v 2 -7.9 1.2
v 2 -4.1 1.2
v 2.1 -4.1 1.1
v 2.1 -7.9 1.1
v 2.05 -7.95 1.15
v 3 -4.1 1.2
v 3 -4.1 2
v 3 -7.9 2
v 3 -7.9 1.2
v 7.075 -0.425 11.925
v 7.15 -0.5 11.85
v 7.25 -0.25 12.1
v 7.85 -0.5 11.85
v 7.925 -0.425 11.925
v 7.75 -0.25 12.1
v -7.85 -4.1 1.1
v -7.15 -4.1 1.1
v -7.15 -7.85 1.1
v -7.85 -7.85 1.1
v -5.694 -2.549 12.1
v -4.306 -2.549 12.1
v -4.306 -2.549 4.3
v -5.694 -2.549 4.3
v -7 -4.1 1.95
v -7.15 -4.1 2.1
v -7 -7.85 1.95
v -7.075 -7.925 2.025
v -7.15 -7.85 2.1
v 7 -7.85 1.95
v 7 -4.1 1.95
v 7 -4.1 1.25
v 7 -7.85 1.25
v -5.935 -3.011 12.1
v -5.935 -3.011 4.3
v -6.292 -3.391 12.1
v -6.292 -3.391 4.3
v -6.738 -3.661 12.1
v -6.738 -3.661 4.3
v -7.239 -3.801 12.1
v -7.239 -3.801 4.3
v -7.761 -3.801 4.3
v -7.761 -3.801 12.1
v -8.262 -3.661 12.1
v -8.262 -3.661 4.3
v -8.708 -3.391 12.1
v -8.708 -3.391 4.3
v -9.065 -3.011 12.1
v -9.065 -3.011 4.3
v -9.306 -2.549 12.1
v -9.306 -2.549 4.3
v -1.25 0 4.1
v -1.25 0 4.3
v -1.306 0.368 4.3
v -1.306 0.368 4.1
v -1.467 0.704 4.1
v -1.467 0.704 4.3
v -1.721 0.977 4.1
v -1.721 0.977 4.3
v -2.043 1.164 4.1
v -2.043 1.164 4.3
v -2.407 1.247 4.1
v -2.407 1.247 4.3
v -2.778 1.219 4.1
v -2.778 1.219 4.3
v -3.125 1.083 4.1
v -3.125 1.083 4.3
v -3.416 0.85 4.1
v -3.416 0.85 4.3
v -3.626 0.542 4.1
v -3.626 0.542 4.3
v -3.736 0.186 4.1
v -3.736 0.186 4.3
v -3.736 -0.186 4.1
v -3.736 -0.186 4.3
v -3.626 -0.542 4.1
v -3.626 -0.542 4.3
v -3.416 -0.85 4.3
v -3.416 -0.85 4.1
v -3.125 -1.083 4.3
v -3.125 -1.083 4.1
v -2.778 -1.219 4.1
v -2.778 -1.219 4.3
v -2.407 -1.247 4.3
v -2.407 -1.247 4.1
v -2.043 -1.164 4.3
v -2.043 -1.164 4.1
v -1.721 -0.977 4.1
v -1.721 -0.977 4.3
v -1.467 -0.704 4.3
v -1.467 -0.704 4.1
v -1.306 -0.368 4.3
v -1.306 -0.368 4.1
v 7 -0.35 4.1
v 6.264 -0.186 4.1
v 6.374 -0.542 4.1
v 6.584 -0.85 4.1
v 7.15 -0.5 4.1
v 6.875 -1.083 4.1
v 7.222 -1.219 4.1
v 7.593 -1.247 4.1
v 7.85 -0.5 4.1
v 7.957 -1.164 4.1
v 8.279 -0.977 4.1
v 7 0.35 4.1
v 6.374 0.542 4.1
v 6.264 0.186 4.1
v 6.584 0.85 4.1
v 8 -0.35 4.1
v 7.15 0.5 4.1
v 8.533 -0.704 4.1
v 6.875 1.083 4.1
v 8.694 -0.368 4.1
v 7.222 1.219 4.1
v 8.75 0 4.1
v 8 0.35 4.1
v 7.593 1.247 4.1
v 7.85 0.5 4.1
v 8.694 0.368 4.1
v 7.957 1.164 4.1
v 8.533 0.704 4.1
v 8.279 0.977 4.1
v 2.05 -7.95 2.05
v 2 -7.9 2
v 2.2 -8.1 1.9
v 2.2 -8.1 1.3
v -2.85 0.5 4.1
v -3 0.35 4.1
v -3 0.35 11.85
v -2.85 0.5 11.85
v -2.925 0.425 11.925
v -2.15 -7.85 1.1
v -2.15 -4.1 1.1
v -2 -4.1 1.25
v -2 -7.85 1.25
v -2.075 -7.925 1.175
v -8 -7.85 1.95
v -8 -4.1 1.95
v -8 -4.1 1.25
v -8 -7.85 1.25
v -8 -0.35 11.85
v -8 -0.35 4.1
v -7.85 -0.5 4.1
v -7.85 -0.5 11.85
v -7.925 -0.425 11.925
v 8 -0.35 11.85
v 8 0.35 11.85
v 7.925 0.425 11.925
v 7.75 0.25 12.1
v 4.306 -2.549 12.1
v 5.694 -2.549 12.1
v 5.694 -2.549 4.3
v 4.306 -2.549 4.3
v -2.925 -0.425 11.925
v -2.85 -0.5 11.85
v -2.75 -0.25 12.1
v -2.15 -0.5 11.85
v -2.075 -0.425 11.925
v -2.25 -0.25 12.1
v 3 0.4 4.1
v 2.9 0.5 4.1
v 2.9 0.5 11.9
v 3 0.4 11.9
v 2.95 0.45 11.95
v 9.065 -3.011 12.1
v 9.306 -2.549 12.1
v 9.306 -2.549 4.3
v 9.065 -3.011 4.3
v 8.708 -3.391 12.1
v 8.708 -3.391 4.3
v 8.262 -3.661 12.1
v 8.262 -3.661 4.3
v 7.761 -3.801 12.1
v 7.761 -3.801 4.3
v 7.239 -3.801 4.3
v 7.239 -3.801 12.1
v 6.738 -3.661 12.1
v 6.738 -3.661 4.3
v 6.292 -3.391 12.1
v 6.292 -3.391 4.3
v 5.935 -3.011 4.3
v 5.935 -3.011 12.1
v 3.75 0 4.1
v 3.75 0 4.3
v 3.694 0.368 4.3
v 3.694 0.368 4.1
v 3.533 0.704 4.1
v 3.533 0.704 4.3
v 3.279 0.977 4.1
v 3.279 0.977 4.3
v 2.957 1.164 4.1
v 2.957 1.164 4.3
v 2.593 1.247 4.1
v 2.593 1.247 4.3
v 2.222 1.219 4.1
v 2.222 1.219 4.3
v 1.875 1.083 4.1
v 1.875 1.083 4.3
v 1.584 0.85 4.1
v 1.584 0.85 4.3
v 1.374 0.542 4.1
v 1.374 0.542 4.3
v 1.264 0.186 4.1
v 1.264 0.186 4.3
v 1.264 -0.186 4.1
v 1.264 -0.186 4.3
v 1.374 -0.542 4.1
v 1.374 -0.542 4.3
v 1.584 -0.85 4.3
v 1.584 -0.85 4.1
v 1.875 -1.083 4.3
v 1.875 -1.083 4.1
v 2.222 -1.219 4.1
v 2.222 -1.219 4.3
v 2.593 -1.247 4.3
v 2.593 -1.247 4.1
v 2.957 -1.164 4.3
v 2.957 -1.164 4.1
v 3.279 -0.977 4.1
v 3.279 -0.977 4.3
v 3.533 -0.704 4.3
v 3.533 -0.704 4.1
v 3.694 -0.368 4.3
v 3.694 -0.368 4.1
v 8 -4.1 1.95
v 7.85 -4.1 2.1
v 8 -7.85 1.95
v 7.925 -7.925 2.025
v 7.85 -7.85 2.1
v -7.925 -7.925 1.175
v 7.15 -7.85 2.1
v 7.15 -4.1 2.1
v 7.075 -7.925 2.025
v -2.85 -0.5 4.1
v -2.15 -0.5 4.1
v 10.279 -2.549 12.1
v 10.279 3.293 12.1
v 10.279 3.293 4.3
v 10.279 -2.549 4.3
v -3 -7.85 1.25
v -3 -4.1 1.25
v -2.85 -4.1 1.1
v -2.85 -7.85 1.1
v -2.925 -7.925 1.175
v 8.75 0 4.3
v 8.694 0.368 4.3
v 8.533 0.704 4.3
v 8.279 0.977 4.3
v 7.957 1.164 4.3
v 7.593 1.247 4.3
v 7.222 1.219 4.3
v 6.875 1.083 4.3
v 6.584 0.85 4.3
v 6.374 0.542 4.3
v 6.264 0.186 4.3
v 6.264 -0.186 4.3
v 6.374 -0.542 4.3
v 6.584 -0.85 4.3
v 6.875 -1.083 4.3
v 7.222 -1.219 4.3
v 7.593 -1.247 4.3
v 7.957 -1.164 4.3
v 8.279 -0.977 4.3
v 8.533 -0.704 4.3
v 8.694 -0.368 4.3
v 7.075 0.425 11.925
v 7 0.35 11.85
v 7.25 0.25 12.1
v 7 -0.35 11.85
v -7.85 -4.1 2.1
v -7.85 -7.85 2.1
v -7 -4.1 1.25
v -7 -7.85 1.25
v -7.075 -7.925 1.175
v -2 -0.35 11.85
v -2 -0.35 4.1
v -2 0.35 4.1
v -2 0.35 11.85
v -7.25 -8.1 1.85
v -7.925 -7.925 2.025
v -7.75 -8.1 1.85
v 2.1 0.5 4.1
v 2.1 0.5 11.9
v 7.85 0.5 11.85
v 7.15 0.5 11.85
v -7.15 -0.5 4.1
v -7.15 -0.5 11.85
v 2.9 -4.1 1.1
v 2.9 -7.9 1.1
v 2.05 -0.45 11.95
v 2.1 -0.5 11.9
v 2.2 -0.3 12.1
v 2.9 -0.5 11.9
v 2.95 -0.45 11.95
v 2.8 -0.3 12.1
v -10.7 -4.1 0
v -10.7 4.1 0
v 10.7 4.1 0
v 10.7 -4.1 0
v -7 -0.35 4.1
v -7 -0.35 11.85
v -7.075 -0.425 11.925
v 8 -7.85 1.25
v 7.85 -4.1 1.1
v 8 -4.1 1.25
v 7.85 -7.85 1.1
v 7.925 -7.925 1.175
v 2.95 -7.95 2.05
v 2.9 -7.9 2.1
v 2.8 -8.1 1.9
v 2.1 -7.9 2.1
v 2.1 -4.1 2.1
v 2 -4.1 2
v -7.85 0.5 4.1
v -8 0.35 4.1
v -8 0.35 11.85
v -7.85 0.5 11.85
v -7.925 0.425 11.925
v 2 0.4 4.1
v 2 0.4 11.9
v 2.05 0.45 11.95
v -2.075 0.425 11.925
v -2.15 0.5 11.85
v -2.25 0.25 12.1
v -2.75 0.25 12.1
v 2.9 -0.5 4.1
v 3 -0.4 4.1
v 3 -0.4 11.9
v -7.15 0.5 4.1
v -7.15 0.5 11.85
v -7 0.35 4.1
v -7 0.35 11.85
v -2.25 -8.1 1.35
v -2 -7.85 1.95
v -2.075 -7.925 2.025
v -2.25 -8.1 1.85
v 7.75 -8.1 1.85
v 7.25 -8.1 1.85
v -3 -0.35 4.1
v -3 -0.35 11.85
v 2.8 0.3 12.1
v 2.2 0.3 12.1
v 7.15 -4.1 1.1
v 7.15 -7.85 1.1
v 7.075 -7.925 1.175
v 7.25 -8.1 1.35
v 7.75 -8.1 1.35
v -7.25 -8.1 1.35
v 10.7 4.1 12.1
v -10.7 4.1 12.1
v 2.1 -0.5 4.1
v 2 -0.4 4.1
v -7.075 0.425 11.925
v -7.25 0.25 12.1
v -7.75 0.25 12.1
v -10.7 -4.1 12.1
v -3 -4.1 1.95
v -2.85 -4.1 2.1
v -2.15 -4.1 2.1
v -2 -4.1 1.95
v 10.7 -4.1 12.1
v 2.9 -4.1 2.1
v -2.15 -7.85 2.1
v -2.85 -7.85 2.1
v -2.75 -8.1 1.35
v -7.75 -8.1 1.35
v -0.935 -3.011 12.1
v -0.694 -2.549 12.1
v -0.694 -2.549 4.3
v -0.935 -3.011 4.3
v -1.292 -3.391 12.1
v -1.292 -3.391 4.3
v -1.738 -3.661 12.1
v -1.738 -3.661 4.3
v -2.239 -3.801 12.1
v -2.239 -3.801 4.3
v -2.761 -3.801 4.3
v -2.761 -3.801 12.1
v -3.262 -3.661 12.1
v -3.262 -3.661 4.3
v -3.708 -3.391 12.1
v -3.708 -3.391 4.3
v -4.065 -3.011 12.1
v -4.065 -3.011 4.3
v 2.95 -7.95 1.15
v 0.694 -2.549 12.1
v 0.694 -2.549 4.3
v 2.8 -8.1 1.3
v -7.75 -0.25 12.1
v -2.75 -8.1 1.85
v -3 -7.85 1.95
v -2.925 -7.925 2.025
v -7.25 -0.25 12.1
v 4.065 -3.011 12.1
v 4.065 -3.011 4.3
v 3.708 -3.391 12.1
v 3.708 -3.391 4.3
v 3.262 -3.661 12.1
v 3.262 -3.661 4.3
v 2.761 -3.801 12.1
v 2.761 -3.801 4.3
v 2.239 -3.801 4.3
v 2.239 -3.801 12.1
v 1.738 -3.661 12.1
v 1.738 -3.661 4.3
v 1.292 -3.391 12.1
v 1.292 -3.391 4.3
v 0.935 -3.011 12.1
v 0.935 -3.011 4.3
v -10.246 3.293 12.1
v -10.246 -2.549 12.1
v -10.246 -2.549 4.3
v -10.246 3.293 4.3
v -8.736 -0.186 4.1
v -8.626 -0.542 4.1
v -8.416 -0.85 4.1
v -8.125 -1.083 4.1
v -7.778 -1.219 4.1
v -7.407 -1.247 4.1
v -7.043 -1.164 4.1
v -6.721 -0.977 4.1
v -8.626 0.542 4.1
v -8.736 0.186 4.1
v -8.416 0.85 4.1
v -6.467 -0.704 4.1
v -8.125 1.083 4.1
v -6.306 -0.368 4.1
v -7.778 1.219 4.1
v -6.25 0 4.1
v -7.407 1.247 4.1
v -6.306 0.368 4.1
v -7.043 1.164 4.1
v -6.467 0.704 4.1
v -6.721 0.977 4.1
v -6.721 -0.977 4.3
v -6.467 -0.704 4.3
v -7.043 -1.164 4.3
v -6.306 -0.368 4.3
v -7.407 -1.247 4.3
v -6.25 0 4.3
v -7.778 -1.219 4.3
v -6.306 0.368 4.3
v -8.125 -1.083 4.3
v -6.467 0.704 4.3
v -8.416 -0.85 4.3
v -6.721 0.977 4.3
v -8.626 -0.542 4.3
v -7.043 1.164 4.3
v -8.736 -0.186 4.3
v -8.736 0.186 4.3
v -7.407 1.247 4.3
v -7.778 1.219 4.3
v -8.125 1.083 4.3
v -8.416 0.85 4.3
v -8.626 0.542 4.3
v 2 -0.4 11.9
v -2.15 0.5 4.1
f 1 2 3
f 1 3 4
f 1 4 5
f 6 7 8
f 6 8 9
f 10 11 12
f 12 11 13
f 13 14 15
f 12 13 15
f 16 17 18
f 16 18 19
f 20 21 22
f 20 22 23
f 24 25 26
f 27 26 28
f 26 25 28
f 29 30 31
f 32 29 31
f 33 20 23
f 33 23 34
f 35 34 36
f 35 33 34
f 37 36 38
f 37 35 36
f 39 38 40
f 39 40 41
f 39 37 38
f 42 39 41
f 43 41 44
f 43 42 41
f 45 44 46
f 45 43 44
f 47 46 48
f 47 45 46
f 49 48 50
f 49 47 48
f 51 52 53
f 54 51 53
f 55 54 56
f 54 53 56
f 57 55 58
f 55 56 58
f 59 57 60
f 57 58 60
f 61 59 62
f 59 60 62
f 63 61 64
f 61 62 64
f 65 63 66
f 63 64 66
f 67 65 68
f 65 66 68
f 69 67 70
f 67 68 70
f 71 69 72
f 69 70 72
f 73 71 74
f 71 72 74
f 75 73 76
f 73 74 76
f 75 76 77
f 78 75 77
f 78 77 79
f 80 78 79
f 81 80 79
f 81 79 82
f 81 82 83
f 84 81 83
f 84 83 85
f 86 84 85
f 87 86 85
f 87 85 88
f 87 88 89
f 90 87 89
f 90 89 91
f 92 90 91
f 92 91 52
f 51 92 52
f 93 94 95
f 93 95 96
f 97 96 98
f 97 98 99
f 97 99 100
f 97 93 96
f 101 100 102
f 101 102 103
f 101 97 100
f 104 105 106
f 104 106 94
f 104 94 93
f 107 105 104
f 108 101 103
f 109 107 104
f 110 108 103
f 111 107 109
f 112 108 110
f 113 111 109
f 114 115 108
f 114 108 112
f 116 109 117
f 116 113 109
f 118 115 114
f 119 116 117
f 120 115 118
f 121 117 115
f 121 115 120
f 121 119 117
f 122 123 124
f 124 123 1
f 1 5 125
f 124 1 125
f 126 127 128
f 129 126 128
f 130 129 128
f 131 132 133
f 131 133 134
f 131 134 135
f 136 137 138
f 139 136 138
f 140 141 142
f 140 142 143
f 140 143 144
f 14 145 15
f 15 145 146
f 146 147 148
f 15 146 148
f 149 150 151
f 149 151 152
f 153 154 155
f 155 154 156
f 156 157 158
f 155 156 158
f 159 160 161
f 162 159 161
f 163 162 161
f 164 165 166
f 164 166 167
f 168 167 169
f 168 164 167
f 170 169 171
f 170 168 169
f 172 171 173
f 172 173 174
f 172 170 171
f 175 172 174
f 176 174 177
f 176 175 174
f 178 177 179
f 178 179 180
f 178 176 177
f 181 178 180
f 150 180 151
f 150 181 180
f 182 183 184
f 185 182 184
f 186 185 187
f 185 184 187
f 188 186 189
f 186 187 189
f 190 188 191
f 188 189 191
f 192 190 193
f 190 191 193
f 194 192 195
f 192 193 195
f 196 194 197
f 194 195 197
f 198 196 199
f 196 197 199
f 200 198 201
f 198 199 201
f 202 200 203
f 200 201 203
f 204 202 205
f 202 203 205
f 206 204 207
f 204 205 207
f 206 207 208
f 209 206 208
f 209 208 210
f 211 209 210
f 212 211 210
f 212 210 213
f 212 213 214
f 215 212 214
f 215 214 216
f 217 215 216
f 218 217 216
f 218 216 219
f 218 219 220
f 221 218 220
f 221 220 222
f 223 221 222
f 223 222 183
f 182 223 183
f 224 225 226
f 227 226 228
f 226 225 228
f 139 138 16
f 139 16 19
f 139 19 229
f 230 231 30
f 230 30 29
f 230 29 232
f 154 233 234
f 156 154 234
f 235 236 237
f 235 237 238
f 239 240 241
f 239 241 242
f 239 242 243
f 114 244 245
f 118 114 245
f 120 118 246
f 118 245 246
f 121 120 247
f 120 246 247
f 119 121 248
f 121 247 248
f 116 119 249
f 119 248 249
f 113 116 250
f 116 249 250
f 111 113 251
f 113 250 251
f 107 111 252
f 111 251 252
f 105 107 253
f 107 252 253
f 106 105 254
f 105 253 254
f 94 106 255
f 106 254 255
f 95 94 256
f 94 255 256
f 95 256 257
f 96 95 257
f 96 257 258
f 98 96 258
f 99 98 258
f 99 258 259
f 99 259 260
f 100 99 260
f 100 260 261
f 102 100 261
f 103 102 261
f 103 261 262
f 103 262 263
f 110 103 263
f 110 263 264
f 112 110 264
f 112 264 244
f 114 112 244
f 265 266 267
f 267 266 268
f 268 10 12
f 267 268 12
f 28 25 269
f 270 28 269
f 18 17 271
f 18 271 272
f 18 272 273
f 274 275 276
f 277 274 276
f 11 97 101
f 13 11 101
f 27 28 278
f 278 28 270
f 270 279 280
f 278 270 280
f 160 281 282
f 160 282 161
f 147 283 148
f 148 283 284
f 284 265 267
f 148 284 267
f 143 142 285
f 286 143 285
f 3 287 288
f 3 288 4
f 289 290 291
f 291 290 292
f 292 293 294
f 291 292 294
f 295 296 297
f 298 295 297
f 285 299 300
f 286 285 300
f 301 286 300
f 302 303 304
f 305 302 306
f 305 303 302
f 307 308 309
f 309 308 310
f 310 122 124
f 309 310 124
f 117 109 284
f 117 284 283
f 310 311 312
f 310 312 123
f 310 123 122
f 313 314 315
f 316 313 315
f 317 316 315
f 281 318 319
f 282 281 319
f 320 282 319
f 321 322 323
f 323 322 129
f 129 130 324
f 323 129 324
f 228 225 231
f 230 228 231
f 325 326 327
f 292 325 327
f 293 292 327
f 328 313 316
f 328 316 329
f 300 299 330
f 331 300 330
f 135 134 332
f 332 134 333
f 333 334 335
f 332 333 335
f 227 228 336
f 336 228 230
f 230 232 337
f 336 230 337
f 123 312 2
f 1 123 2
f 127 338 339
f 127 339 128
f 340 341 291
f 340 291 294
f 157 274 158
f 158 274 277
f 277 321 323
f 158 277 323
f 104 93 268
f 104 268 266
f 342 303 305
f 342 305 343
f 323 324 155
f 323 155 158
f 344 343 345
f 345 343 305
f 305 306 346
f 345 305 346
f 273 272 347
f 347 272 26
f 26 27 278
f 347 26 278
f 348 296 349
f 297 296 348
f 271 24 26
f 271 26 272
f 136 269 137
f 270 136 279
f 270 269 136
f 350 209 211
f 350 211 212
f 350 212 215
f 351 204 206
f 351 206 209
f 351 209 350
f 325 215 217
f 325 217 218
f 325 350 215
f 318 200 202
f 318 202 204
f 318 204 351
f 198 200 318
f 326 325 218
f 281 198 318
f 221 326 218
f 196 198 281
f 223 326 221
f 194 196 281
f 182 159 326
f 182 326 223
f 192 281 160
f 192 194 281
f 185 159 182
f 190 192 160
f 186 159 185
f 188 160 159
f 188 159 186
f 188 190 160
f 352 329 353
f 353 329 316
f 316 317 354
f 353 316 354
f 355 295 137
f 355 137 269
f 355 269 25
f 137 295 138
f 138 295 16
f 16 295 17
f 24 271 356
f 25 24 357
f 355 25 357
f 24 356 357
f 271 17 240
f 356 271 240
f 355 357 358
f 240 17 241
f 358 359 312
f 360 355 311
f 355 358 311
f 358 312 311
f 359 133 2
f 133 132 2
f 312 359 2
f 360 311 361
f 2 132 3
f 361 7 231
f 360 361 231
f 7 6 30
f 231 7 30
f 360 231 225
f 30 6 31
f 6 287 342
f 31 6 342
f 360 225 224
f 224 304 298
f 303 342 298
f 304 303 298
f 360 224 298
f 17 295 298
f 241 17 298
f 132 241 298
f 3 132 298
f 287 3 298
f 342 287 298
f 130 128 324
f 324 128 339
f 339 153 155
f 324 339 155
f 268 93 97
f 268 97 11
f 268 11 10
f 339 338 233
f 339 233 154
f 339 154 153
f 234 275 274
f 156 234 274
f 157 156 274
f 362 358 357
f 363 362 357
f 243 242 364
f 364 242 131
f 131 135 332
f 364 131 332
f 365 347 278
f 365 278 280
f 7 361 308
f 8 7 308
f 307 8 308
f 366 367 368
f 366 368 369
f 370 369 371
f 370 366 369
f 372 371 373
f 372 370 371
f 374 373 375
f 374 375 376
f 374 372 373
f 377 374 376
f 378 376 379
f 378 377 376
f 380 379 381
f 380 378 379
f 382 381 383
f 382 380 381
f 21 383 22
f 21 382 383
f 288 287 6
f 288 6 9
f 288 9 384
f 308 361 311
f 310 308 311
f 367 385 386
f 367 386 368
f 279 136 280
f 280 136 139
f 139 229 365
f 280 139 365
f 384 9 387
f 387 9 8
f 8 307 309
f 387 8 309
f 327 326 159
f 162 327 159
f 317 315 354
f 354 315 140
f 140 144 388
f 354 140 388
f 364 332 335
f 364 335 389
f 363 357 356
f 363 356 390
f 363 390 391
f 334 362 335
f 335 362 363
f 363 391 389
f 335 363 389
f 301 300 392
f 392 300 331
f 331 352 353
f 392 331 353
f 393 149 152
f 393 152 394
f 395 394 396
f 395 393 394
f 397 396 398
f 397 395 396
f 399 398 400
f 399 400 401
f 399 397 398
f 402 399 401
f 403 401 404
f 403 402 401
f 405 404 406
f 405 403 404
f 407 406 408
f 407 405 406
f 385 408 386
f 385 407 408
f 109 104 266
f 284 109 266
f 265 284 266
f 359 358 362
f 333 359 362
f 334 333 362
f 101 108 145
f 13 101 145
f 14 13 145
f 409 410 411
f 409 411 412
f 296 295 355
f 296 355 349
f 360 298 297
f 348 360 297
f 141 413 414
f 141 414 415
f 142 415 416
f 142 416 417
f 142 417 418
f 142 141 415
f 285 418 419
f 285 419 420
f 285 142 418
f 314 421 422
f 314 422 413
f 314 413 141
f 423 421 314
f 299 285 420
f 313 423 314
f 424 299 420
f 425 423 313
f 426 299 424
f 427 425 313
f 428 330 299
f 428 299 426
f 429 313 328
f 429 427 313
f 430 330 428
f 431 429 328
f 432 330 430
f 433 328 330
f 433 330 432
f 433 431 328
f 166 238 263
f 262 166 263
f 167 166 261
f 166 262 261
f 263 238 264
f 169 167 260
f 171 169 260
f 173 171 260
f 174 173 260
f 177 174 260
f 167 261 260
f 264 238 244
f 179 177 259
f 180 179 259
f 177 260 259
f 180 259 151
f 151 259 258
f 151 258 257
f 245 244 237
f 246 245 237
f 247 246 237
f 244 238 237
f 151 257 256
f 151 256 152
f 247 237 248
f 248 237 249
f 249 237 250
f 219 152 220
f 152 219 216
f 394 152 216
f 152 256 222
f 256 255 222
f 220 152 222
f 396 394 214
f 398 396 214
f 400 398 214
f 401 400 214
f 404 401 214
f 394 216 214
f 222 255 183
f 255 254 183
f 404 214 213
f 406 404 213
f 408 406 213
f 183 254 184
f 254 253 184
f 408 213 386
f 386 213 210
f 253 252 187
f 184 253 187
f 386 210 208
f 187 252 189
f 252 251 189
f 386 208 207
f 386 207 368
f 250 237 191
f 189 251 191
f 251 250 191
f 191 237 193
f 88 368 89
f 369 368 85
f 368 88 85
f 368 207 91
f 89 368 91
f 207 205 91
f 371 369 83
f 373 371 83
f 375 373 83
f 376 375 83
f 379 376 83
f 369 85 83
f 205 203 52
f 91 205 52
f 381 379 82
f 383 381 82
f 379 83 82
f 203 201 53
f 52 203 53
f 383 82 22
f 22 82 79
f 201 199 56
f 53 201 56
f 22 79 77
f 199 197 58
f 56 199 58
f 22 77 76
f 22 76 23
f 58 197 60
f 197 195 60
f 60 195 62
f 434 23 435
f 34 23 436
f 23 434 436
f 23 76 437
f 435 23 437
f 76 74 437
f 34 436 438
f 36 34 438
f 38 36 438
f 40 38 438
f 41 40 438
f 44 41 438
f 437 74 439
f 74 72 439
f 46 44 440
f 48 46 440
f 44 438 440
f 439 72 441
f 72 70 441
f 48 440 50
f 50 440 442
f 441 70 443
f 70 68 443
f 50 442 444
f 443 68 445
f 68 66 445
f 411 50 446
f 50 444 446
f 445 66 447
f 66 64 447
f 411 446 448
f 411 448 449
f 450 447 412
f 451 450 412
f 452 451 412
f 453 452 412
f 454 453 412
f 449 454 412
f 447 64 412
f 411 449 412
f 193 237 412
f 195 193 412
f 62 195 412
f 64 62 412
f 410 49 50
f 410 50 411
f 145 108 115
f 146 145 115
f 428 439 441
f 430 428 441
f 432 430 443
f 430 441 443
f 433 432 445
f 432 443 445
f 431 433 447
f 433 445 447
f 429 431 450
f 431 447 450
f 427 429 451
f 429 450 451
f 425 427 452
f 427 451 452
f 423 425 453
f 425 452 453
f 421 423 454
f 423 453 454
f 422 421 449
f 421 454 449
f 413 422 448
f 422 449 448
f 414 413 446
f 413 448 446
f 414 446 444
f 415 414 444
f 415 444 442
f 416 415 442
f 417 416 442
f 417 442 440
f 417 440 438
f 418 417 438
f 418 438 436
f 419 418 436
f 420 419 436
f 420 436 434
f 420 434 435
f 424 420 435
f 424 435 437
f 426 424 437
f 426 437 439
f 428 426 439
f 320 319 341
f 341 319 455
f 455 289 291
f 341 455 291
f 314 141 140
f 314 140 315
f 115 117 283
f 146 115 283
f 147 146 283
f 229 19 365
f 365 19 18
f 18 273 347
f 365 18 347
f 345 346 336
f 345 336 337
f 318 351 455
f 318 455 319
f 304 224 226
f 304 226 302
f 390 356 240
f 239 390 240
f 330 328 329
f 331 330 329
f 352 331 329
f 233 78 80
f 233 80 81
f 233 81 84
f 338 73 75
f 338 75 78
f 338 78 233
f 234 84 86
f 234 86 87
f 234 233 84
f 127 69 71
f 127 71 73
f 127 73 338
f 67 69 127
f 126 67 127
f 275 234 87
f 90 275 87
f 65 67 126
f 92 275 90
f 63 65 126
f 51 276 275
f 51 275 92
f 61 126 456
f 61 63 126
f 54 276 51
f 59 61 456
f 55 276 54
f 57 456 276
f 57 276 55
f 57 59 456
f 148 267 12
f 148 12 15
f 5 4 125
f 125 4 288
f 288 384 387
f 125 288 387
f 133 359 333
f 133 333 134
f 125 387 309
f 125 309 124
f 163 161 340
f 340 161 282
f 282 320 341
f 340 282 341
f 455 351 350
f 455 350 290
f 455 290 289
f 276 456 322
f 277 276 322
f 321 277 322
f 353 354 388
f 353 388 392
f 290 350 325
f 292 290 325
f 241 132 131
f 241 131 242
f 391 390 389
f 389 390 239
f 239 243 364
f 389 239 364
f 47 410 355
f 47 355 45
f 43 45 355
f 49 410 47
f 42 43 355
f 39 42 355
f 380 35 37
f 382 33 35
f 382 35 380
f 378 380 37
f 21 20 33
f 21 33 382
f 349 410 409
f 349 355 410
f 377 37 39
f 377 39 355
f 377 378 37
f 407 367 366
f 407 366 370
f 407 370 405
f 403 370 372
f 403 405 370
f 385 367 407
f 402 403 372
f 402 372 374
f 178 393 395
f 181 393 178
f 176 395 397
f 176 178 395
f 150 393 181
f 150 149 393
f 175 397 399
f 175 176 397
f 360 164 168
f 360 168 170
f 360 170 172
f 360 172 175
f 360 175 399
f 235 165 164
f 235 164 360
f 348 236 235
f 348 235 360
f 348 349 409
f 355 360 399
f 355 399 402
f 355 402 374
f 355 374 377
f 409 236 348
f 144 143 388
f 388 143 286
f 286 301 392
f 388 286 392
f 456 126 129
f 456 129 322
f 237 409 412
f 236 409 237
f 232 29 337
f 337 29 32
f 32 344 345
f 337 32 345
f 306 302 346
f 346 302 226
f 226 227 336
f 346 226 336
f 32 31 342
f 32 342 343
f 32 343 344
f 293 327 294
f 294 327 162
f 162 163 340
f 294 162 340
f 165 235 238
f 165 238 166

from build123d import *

# Parameters (mm, degrees)
SKETCH_1_W          = 21.4
SKETCH_1_H          = 8.2
EXTRUDE_1_DEPTH     = 12.1
SKETCH_4_R          = 1.25
CUT_EXTRUDE_3_DEPTH = 8
CUT_EXTRUDE_4_DEPTH = 7.8
SKETCH_7_W          = 1
SKETCH_7_H          = 1
EXTRUDE_2_DEPTH     = 8
CHAMFER_1_SIZE      = 0.15
CHAMFER_2_SIZE      = 0.25
SKETCH_8_W          = 1
SKETCH_8_H          = 1
EXTRUDE_3_DEPTH     = 4
CHAMFER_3_SIZE      = 0.15
CHAMFER_4_SIZE      = 0.25
CHAMFER_6_SIZE      = 0.1
CHAMFER_7_SIZE      = 0.2
CHAMFER_8_SIZE      = 0.1
CHAMFER_9_SIZE      = 0.2


with BuildPart() as part:
    # Эскиз1 → Бобышка-Вытянуть1 (new body)
    with BuildSketch(Plane.XY):
        Rectangle(SKETCH_1_W, SKETCH_1_H)
    extrude(amount=EXTRUDE_1_DEPTH)

    # Эскиз4 → Вырез-Вытянуть3 (cut)
    with BuildSketch(Plane.XY.offset(12.1)):
        with Locations((-7.5, 0)):
            Circle(SKETCH_4_R)
        with Locations((-2.5, 0)):
            Circle(SKETCH_4_R)
        with Locations((2.5, 0)):
            Circle(SKETCH_4_R)
        with Locations((7.5, 0)):
            Circle(SKETCH_4_R)
    extrude(amount=-CUT_EXTRUDE_3_DEPTH, mode=Mode.SUBTRACT)

    # Эскиз5 → Вырез-Вытянуть4 (cut)
    with BuildSketch(Plane.XY.offset(12.1)):
        with BuildLine():
            Line((-10.245621634, 0), (-10.245621634, 3.292901982))
            Line((-10.245621634, 3.292901982), (0.278509544, 3.292901982))
            Line((0.278509544, 3.292901982), (5.278509544, 3.292901982))
            Line((5.278509544, 3.292901982), (10.278509544, 3.292901982))
            Line((10.278509544, 3.292901982), (10.278509544, -2.548957219))
            Line((10.278509544, -2.548957219), (9.30582632, -2.548957219))
            ThreePointArc((9.30582632, -2.548957219), (7.5, -3.818893996), (5.69417368, -2.548957219))
            Line((5.69417368, -2.548957219), (4.30582632, -2.548957219))
            ThreePointArc((4.30582632, -2.548957219), (2.5, -3.818893996), (0.69417368, -2.548957219))
            Line((0.69417368, -2.548957219), (-0.69417368, -2.548957219))
            ThreePointArc((-0.69417368, -2.548957219), (-2.5, -3.818893996), (-4.30582632, -2.548957219))
            Line((-4.30582632, -2.548957219), (-5.69417368, -2.548957219))
            ThreePointArc((-5.69417368, -2.548957219), (-7.5, -3.818893996), (-9.30582632, -2.548957219))
            Line((-9.30582632, -2.548957219), (-10.245621634, -2.548957219))
            Line((-10.245621634, -2.548957219), (-10.245621634, 0))
        make_face()
    extrude(amount=-CUT_EXTRUDE_4_DEPTH, mode=Mode.SUBTRACT)

    # Эскиз7 → Бобышка-Вытянуть2 (add)
    with BuildSketch(Plane.XY.offset(4.1)):
        with Locations((-2.5, 0)):
            Rectangle(SKETCH_7_W, SKETCH_7_H)
        with Locations((-7.5, 0)):
            Rectangle(SKETCH_7_W, SKETCH_7_H)
        with Locations((2.5, 0)):
            Rectangle(SKETCH_7_W, SKETCH_7_H)
        with Locations((7.5, 0)):
            Rectangle(SKETCH_7_W, SKETCH_7_H)
    extrude(amount=EXTRUDE_2_DEPTH)

    # Фаска1
    chamfer_1_edges = [part.edges().sort_by_distance(p)[0] for p in [
        (-7, -0.5, 8.1),
        (-7, 0.5, 8.1),
        (-8, 0.5, 8.1),
        (-8, -0.5, 8.1),
        (-2, -0.5, 8.1),
        (-2, 0.5, 8.1),
        (-3, 0.5, 8.1),
        (-3, -0.5, 8.1),
    ]]
    chamfer(chamfer_1_edges, length=CHAMFER_1_SIZE)

    # Фаска2
    # the kernel refuses this chamfer: 0.25 mm, written as the material it takes off along each edge
    with BuildSketch(Plane(origin=(-3, -0.992920747, 12.1), x_dir=(-0.02749587661058555, 0, -0.9996219169112968), z_dir=(0, 1, 0)), Plane(origin=(-3.492920747, 0.5, 12.1), x_dir=(0, 0.027495876610586414, -0.9996219169112968), z_dir=(1, 0, 0)), Plane(origin=(-2, 0.992920747, 12.1), x_dir=(0.027495876610586414, 0, -0.9996219169112968), z_dir=(0, -1, 0)), Plane(origin=(-1.507079253, -0.5, 12.1), x_dir=(0, -0.027495876610586414, -0.9996219169112968), z_dir=(-1, 0, 0)), Plane(origin=(-7, 0.992920747, 12.1), x_dir=(0.02749587661058555, 0, -0.9996219169112968), z_dir=(0, -1, 0)), Plane(origin=(-6.507079253, -0.5, 12.1), x_dir=(0, -0.027495876610586414, -0.9996219169112968), z_dir=(-1, 0, 0)), Plane(origin=(-8, -0.992920747, 12.1), x_dir=(-0.027495876610589005, 0, -0.9996219169112968), z_dir=(0, 1, 0)), Plane(origin=(-8.492920747, 0.5, 12.1), x_dir=(0, 0.027495876610586414, -0.9996219169112968), z_dir=(1, 0, 0))) as chamfer_2_piece_1:
        Polygon((CHAMFER_2_SIZE * 0.999621916911, -CHAMFER_2_SIZE * 0.0274958766106), (-CHAMFER_2_SIZE * 0.0274958766106, -CHAMFER_2_SIZE * 0.999621916911), (0, 0), align=None)
    extrude(amount=1.985841494, mode=Mode.SUBTRACT)

    # Эскиз8 → Бобышка-Вытянуть3 (add)
    with BuildSketch(Plane(origin=(0, -4.1, 0), x_dir=(-1, 0, 0), z_dir=(0, -1, 0))):
        with Locations((2.5, -1.6)):
            Rectangle(SKETCH_8_W, SKETCH_8_H)
        with Locations((7.5, -1.6)):
            Rectangle(SKETCH_8_W, SKETCH_8_H)
        with Locations((-2.5, -1.6)):
            Rectangle(SKETCH_8_W, SKETCH_8_H)
        with Locations((-7.5, -1.6)):
            Rectangle(SKETCH_8_W, SKETCH_8_H)
    extrude(amount=EXTRUDE_3_DEPTH)

    # Фаска3
    chamfer_3_edges = [part.edges().sort_by_distance(p)[0] for p in [
        (8, -0.5, 8.1),
        (8, 0.5, 8.1),
        (7, 0.5, 8.1),
        (7, -0.5, 8.1),
        (-7, -6.1, 1.1),
        (-7, -6.1, 2.1),
        (-8, -6.1, 2.1),
        (-8, -6.1, 1.1),
        (-2, -6.1, 1.1),
        (-2, -6.1, 2.1),
        (-3, -6.1, 2.1),
        (-3, -6.1, 1.1),
        (8, -6.1, 1.1),
        (8, -6.1, 2.1),
        (7, -6.1, 2.1),
        (7, -6.1, 1.1),
    ]]
    chamfer(chamfer_3_edges, length=CHAMFER_3_SIZE)

    # Фаска4
    # the kernel refuses this chamfer: 0.25 mm, written as the material it takes off along each edge
    with BuildSketch(Plane(origin=(-2, -8.1, 2.592920747), x_dir=(0.02749587661058651, 0.9996219169112968, 0), z_dir=(0, 0, -1)), Plane(origin=(-3, -8.1, 0.607079253), x_dir=(-0.027495876610585647, 0.9996219169112968, 0), z_dir=(0, 0, 1)), Plane(origin=(-3.492920747, -8.1, 2.1), x_dir=(0, 0.9996219169112968, 0.027495876610585647), z_dir=(1, 0, 0)), Plane(origin=(-1.507079253, -8.1, 1.1), x_dir=(0, 0.9996219169112968, -0.02749587661058651), z_dir=(-1, 0, 0)), Plane(origin=(-8, -8.1, 0.607079253), x_dir=(-0.0274958766105891, 0.9996219169112968, 0), z_dir=(0, 0, 1)), Plane(origin=(-8.492920747, -8.1, 2.1), x_dir=(0, 0.9996219169112968, 0.027495876610585647), z_dir=(1, 0, 0)), Plane(origin=(-7, -8.1, 2.592920747), x_dir=(0.027495876610585647, 0.9996219169112968, 0), z_dir=(0, 0, -1)), Plane(origin=(-6.507079253, -8.1, 1.1), x_dir=(0, 0.9996219169112968, -0.02749587661058651), z_dir=(-1, 0, 0)), Plane(origin=(8.492920747, -8.1, 1.1), x_dir=(0, 0.9996219169112968, -0.02749587661058651), z_dir=(-1, 0, 0)), Plane(origin=(7, -8.1, 0.607079253), x_dir=(-0.027495876610585647, 0.9996219169112968, 0), z_dir=(0, 0, 1)), Plane(origin=(6.507079253, -8.1, 2.1), x_dir=(0, 0.9996219169112968, 0.027495876610585647), z_dir=(1, 0, 0)), Plane(origin=(8, -8.1, 2.592920747), x_dir=(0.0274958766105891, 0.9996219169112968, 0), z_dir=(0, 0, -1)), Plane(origin=(8.492920747, -0.5, 12.1), x_dir=(0, -0.027495876610586414, -0.9996219169112968), z_dir=(-1, 0, 0)), Plane(origin=(7, -0.992920747, 12.1), x_dir=(-0.02749587661058555, 0, -0.9996219169112968), z_dir=(0, 1, 0)), Plane(origin=(8, 0.992920747, 12.1), x_dir=(0.027495876610589005, 0, -0.9996219169112968), z_dir=(0, -1, 0)), Plane(origin=(6.507079253, 0.5, 12.1), x_dir=(0, 0.027495876610586414, -0.9996219169112968), z_dir=(1, 0, 0))) as chamfer_4_piece_1:
        Polygon((CHAMFER_4_SIZE * 0.999621916911, -CHAMFER_4_SIZE * 0.0274958766106), (-CHAMFER_4_SIZE * 0.0274958766106, -CHAMFER_4_SIZE * 0.999621916911), (0, 0), align=None)
    extrude(amount=1.985841494, mode=Mode.SUBTRACT)

    # Фаска6
    chamfer_6_edges = [part.edges().sort_by_distance(p)[0] for p in [
        (3, -0.5, 8.1),
        (3, 0.5, 8.1),
        (2, 0.5, 8.1),
        (2, -0.5, 8.1),
    ]]
    chamfer(chamfer_6_edges, length=CHAMFER_6_SIZE)

    # Фаска7
    # the kernel refuses this chamfer: 0.2 mm, written as the material it takes off along each edge
    with BuildSketch(Plane(origin=(3, 0.914336598, 12.1), x_dir=(0.02749587661058742, 0, -0.9996219169112966), z_dir=(0, -1, 0)), Plane(origin=(3.414336598, -0.5, 12.1), x_dir=(0, -0.02749587661058634, -0.9996219169112966), z_dir=(-1, 0, 0)), Plane(origin=(2, -0.914336598, 12.1), x_dir=(-0.02749587661058634, 0, -0.9996219169112966), z_dir=(0, 1, 0)), Plane(origin=(1.585663402, 0.5, 12.1), x_dir=(0, 0.02749587661058634, -0.9996219169112966), z_dir=(1, 0, 0))) as chamfer_7_piece_1:
        Polygon((CHAMFER_7_SIZE * 0.999621916911, -CHAMFER_7_SIZE * 0.0274958766106), (-CHAMFER_7_SIZE * 0.0274958766106, -CHAMFER_7_SIZE * 0.999621916911), (0, 0), align=None)
    extrude(amount=1.828673195, mode=Mode.SUBTRACT)

    # Фаска8
    chamfer_8_edges = [part.edges().sort_by_distance(p)[0] for p in [
        (3, -6.1, 1.1),
        (3, -6.1, 2.1),
        (2, -6.1, 2.1),
        (2, -6.1, 1.1),
    ]]
    chamfer(chamfer_8_edges, length=CHAMFER_8_SIZE)

    # Фаска9
    # the kernel refuses this chamfer: 0.2 mm, written as the material it takes off along each edge
    with BuildSketch(Plane(origin=(3, -8.1, 2.514336598), x_dir=(0.027495876610587302, 0.9996219169112966, 0), z_dir=(0, 0, -1)), Plane(origin=(3.414336598, -8.1, 1.1), x_dir=(0, 0.9996219169112968, -0.027495876610586226), z_dir=(-1, 0, 0)), Plane(origin=(2, -8.1, 0.685663402), x_dir=(-0.027495876610586223, 0.9996219169112966, 0), z_dir=(0, 0, 1)), Plane(origin=(1.585663402, -8.1, 2.1), x_dir=(0, 0.9996219169112966, 0.027495876610587302), z_dir=(1, 0, 0))) as chamfer_9_piece_1:
        Polygon((CHAMFER_9_SIZE * 0.999621916911, -CHAMFER_9_SIZE * 0.0274958766106), (-CHAMFER_9_SIZE * 0.0274958766106, -CHAMFER_9_SIZE * 0.999621916911), (0, 0), align=None)
    extrude(amount=1.828673195, mode=Mode.SUBTRACT)


solid = part.part
